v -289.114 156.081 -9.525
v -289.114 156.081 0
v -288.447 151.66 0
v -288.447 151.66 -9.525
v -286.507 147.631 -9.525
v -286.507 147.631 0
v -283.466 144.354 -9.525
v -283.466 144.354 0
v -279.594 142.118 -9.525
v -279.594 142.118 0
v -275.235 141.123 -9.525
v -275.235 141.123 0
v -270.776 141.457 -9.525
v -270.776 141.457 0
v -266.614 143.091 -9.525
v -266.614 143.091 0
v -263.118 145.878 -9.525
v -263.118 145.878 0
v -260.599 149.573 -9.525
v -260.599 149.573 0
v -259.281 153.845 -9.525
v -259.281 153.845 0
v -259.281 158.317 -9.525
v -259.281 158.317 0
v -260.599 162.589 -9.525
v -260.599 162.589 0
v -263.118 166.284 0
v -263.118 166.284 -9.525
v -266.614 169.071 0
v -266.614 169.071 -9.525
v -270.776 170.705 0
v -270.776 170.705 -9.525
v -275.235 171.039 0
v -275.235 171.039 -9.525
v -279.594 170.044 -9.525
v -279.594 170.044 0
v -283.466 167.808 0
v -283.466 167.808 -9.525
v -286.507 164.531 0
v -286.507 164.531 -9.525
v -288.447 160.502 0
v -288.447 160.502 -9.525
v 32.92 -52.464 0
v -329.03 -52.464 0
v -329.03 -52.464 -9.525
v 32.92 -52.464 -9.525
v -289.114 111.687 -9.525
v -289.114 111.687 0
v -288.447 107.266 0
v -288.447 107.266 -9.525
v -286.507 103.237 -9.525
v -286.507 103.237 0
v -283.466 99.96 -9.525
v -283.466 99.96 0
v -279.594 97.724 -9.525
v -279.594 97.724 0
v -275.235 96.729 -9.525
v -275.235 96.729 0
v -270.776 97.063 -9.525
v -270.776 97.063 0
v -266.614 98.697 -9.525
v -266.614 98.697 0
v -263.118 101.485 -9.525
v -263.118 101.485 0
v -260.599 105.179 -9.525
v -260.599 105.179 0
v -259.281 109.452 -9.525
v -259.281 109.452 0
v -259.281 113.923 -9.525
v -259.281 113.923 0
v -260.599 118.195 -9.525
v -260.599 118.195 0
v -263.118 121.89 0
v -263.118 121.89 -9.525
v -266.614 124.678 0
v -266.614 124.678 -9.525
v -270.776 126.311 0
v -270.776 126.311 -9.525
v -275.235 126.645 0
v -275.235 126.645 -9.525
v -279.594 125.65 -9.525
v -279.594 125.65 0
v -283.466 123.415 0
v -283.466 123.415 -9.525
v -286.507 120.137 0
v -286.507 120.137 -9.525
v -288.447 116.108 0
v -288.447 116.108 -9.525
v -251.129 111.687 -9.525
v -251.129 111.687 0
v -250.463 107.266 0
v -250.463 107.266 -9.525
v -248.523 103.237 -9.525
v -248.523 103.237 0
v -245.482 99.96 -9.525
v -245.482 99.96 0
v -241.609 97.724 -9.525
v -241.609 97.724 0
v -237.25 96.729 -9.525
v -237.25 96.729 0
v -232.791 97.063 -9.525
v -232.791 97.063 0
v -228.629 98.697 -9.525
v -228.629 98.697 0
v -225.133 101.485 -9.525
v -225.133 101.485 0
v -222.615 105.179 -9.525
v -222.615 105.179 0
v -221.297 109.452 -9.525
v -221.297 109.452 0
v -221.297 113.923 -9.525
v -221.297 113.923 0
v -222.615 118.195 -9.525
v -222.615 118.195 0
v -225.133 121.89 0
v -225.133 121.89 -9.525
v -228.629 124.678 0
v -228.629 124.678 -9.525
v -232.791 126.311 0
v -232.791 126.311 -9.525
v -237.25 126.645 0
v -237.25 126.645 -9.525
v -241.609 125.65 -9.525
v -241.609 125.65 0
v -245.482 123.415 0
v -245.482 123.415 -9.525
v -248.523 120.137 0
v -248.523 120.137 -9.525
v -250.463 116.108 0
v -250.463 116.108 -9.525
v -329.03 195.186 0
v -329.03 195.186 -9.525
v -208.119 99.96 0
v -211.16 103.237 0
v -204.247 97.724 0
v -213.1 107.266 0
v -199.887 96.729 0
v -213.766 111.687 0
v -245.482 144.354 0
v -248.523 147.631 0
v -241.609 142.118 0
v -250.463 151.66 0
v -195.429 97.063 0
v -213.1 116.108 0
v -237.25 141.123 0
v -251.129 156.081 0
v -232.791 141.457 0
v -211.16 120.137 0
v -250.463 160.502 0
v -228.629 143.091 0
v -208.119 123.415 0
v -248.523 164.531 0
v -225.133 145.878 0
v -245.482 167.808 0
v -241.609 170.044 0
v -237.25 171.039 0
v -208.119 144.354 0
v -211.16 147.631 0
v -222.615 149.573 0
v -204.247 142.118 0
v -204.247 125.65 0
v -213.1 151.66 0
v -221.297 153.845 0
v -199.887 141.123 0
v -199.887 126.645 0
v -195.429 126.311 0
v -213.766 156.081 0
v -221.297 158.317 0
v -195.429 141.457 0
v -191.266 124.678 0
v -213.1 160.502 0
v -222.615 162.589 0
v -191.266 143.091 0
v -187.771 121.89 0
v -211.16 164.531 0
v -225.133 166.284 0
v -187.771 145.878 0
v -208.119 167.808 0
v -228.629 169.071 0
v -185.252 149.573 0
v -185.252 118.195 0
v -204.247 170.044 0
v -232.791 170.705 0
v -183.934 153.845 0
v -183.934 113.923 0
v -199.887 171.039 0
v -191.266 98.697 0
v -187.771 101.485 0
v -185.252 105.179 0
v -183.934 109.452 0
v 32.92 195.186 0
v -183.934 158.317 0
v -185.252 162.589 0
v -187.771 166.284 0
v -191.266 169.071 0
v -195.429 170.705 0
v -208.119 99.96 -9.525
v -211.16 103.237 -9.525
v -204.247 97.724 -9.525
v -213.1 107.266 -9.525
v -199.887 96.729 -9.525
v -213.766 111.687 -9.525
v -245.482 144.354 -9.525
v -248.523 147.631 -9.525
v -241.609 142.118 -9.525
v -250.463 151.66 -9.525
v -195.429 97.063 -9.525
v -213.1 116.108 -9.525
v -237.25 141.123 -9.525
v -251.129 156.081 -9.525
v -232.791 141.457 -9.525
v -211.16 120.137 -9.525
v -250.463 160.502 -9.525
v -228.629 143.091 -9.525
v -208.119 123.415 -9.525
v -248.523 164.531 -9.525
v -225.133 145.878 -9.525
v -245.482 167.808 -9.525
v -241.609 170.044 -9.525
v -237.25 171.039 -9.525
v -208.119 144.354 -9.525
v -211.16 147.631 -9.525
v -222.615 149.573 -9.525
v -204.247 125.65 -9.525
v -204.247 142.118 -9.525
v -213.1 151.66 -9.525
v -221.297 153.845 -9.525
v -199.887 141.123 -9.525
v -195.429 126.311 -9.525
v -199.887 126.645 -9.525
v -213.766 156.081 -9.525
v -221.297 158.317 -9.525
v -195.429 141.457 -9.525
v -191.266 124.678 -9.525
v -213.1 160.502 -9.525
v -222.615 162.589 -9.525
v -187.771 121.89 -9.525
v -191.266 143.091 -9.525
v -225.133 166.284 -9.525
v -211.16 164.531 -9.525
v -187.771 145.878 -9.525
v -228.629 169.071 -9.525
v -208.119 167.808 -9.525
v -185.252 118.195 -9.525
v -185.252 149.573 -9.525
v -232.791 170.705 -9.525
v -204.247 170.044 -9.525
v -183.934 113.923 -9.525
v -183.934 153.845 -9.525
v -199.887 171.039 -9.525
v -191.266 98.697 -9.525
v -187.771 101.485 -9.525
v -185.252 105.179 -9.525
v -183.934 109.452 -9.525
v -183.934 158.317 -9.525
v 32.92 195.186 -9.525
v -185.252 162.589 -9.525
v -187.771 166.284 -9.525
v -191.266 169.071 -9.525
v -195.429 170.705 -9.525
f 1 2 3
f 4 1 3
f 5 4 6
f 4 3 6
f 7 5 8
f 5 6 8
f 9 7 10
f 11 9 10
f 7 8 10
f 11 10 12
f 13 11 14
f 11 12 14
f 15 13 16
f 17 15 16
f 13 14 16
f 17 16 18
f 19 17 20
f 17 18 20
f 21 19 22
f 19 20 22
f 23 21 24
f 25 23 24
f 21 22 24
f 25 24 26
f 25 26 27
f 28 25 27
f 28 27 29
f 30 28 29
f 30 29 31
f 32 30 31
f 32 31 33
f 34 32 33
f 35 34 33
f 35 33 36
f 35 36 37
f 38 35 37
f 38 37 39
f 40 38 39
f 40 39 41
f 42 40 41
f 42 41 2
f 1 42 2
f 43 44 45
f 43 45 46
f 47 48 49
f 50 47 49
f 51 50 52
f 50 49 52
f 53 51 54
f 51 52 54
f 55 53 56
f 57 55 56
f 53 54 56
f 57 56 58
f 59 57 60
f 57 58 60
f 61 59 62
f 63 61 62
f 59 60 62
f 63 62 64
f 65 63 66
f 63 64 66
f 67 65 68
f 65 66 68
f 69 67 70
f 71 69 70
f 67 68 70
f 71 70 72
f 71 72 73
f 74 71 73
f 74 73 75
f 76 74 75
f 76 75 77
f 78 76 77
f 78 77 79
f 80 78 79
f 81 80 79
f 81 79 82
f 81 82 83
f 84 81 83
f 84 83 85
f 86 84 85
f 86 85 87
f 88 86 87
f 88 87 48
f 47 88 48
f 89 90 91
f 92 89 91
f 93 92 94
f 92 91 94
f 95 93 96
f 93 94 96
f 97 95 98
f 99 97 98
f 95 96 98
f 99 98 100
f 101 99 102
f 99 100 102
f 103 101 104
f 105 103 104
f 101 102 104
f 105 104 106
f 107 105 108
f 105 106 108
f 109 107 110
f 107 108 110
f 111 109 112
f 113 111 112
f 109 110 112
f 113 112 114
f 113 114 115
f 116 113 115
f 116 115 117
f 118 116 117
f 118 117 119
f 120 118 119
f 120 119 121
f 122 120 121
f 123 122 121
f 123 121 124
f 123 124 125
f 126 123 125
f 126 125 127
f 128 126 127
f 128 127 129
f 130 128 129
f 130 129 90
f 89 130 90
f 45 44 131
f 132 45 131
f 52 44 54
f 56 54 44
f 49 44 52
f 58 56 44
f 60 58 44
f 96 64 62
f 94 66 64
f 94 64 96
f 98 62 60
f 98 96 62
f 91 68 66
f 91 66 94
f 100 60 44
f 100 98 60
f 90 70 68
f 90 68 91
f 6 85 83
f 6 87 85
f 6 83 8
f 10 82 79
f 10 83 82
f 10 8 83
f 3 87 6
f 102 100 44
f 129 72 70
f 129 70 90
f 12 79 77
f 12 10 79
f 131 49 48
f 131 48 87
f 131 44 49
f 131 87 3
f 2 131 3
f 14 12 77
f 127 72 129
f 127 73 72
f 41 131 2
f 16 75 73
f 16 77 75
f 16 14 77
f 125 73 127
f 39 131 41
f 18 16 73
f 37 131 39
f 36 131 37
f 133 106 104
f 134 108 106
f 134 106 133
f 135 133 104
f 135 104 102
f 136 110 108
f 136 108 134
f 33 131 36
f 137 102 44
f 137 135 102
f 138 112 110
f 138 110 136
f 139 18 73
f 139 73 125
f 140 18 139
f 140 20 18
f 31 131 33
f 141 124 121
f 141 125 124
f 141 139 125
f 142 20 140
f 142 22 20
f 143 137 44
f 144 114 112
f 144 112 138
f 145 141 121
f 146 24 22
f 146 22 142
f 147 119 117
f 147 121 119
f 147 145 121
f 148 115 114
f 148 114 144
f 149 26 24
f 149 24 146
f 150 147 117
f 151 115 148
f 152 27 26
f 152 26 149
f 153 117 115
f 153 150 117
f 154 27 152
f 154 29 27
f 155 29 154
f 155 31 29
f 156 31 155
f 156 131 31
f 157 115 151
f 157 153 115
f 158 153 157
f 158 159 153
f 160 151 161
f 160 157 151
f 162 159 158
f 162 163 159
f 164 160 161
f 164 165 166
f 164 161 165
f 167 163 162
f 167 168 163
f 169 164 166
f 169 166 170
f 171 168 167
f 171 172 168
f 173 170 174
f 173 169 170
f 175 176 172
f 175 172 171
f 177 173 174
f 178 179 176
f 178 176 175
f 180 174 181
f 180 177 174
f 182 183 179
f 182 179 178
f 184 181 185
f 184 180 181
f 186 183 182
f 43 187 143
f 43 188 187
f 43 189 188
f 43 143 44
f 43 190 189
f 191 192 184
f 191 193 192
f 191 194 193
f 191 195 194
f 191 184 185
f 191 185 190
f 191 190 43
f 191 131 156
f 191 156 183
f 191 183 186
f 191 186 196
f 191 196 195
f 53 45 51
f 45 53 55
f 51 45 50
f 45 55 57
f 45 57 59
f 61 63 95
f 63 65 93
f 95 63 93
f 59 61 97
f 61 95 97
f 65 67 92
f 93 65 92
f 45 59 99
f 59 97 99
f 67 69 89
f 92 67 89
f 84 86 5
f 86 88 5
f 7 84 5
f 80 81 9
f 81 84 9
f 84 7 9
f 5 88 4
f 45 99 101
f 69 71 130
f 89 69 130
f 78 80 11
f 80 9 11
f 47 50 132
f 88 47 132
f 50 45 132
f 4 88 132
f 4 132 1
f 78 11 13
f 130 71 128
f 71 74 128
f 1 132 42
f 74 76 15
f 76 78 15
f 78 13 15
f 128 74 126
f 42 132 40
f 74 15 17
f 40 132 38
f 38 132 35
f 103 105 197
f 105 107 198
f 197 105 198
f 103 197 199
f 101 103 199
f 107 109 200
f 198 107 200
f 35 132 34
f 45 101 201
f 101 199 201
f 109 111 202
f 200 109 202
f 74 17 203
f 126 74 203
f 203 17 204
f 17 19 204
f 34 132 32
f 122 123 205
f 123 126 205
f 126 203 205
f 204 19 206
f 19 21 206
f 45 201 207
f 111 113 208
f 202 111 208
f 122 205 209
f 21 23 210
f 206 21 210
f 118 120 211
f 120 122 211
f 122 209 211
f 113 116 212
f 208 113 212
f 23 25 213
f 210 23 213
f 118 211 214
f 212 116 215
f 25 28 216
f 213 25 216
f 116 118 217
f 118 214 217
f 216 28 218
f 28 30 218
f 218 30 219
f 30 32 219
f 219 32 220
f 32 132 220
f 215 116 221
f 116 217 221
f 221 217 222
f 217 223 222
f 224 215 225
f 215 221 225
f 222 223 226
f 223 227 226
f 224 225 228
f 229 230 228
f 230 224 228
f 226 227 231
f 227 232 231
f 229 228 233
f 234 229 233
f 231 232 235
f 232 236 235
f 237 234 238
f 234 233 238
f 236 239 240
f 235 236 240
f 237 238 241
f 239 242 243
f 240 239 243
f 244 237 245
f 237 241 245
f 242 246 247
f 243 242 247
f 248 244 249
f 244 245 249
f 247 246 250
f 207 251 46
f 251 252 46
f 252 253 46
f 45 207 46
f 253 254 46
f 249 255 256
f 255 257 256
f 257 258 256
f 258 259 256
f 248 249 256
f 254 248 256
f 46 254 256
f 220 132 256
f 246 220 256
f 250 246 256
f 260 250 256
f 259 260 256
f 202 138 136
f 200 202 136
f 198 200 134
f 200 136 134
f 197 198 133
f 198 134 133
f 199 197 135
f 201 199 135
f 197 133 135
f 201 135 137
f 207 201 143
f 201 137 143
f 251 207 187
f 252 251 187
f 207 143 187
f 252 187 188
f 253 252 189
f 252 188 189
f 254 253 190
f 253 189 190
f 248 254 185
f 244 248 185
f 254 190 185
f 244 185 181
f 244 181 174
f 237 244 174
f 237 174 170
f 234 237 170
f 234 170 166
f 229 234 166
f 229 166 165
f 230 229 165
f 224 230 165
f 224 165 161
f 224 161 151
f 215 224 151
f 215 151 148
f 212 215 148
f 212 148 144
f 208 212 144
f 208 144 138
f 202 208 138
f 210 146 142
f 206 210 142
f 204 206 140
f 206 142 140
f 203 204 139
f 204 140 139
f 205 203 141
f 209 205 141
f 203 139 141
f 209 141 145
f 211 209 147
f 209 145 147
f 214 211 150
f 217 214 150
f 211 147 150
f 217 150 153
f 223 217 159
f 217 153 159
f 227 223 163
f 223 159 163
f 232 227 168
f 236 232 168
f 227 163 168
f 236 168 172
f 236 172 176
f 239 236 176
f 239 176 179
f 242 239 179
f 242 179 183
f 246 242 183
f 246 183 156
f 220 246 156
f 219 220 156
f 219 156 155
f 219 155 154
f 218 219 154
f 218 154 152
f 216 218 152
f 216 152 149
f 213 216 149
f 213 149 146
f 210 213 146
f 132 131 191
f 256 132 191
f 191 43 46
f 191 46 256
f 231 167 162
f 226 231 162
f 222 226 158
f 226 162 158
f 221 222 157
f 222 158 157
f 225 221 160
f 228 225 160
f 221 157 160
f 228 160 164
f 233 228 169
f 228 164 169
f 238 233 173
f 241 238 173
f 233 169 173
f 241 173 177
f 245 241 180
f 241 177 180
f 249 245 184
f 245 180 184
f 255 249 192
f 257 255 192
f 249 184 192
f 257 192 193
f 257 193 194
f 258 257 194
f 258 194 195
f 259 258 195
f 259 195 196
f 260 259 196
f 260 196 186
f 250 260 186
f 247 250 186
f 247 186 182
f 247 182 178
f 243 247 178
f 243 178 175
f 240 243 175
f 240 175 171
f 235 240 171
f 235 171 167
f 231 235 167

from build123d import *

# Parameters (mm, degrees)
F0_W     = 361.95
F0_H     = 247.65
F1_DEPTH = 9.525
F3_D     = 30


# Not quite as in the source:
# - a feature names something its author has since deleted; it is built from what else it names


with BuildPart() as f1:
    # F0 (on Top) → F1 (new body)
    with BuildSketch(Plane.XY):
        with Locations((-148.0553561452, 71.3610090315)):
            Rectangle(F0_W, F0_H)
    extrude(amount=-F1_DEPTH)

    # F3 (through all)
    with Locations(Plane(origin=(0, 0, -9.525), x_dir=(1, 0, 0), z_dir=(0, 0, -1))):
        with Locations((-236.1291795969, -111.6871535778), (-236.1291795969, -156.0809910297), (-198.7664848566, -111.6871535778), (-274.1136550903, -156.0809910297), (-198.7664848566, -156.0809910297), (-274.1136550903, -111.6871535778)):
            Hole(F3_D / 2)


solid = f1.part
